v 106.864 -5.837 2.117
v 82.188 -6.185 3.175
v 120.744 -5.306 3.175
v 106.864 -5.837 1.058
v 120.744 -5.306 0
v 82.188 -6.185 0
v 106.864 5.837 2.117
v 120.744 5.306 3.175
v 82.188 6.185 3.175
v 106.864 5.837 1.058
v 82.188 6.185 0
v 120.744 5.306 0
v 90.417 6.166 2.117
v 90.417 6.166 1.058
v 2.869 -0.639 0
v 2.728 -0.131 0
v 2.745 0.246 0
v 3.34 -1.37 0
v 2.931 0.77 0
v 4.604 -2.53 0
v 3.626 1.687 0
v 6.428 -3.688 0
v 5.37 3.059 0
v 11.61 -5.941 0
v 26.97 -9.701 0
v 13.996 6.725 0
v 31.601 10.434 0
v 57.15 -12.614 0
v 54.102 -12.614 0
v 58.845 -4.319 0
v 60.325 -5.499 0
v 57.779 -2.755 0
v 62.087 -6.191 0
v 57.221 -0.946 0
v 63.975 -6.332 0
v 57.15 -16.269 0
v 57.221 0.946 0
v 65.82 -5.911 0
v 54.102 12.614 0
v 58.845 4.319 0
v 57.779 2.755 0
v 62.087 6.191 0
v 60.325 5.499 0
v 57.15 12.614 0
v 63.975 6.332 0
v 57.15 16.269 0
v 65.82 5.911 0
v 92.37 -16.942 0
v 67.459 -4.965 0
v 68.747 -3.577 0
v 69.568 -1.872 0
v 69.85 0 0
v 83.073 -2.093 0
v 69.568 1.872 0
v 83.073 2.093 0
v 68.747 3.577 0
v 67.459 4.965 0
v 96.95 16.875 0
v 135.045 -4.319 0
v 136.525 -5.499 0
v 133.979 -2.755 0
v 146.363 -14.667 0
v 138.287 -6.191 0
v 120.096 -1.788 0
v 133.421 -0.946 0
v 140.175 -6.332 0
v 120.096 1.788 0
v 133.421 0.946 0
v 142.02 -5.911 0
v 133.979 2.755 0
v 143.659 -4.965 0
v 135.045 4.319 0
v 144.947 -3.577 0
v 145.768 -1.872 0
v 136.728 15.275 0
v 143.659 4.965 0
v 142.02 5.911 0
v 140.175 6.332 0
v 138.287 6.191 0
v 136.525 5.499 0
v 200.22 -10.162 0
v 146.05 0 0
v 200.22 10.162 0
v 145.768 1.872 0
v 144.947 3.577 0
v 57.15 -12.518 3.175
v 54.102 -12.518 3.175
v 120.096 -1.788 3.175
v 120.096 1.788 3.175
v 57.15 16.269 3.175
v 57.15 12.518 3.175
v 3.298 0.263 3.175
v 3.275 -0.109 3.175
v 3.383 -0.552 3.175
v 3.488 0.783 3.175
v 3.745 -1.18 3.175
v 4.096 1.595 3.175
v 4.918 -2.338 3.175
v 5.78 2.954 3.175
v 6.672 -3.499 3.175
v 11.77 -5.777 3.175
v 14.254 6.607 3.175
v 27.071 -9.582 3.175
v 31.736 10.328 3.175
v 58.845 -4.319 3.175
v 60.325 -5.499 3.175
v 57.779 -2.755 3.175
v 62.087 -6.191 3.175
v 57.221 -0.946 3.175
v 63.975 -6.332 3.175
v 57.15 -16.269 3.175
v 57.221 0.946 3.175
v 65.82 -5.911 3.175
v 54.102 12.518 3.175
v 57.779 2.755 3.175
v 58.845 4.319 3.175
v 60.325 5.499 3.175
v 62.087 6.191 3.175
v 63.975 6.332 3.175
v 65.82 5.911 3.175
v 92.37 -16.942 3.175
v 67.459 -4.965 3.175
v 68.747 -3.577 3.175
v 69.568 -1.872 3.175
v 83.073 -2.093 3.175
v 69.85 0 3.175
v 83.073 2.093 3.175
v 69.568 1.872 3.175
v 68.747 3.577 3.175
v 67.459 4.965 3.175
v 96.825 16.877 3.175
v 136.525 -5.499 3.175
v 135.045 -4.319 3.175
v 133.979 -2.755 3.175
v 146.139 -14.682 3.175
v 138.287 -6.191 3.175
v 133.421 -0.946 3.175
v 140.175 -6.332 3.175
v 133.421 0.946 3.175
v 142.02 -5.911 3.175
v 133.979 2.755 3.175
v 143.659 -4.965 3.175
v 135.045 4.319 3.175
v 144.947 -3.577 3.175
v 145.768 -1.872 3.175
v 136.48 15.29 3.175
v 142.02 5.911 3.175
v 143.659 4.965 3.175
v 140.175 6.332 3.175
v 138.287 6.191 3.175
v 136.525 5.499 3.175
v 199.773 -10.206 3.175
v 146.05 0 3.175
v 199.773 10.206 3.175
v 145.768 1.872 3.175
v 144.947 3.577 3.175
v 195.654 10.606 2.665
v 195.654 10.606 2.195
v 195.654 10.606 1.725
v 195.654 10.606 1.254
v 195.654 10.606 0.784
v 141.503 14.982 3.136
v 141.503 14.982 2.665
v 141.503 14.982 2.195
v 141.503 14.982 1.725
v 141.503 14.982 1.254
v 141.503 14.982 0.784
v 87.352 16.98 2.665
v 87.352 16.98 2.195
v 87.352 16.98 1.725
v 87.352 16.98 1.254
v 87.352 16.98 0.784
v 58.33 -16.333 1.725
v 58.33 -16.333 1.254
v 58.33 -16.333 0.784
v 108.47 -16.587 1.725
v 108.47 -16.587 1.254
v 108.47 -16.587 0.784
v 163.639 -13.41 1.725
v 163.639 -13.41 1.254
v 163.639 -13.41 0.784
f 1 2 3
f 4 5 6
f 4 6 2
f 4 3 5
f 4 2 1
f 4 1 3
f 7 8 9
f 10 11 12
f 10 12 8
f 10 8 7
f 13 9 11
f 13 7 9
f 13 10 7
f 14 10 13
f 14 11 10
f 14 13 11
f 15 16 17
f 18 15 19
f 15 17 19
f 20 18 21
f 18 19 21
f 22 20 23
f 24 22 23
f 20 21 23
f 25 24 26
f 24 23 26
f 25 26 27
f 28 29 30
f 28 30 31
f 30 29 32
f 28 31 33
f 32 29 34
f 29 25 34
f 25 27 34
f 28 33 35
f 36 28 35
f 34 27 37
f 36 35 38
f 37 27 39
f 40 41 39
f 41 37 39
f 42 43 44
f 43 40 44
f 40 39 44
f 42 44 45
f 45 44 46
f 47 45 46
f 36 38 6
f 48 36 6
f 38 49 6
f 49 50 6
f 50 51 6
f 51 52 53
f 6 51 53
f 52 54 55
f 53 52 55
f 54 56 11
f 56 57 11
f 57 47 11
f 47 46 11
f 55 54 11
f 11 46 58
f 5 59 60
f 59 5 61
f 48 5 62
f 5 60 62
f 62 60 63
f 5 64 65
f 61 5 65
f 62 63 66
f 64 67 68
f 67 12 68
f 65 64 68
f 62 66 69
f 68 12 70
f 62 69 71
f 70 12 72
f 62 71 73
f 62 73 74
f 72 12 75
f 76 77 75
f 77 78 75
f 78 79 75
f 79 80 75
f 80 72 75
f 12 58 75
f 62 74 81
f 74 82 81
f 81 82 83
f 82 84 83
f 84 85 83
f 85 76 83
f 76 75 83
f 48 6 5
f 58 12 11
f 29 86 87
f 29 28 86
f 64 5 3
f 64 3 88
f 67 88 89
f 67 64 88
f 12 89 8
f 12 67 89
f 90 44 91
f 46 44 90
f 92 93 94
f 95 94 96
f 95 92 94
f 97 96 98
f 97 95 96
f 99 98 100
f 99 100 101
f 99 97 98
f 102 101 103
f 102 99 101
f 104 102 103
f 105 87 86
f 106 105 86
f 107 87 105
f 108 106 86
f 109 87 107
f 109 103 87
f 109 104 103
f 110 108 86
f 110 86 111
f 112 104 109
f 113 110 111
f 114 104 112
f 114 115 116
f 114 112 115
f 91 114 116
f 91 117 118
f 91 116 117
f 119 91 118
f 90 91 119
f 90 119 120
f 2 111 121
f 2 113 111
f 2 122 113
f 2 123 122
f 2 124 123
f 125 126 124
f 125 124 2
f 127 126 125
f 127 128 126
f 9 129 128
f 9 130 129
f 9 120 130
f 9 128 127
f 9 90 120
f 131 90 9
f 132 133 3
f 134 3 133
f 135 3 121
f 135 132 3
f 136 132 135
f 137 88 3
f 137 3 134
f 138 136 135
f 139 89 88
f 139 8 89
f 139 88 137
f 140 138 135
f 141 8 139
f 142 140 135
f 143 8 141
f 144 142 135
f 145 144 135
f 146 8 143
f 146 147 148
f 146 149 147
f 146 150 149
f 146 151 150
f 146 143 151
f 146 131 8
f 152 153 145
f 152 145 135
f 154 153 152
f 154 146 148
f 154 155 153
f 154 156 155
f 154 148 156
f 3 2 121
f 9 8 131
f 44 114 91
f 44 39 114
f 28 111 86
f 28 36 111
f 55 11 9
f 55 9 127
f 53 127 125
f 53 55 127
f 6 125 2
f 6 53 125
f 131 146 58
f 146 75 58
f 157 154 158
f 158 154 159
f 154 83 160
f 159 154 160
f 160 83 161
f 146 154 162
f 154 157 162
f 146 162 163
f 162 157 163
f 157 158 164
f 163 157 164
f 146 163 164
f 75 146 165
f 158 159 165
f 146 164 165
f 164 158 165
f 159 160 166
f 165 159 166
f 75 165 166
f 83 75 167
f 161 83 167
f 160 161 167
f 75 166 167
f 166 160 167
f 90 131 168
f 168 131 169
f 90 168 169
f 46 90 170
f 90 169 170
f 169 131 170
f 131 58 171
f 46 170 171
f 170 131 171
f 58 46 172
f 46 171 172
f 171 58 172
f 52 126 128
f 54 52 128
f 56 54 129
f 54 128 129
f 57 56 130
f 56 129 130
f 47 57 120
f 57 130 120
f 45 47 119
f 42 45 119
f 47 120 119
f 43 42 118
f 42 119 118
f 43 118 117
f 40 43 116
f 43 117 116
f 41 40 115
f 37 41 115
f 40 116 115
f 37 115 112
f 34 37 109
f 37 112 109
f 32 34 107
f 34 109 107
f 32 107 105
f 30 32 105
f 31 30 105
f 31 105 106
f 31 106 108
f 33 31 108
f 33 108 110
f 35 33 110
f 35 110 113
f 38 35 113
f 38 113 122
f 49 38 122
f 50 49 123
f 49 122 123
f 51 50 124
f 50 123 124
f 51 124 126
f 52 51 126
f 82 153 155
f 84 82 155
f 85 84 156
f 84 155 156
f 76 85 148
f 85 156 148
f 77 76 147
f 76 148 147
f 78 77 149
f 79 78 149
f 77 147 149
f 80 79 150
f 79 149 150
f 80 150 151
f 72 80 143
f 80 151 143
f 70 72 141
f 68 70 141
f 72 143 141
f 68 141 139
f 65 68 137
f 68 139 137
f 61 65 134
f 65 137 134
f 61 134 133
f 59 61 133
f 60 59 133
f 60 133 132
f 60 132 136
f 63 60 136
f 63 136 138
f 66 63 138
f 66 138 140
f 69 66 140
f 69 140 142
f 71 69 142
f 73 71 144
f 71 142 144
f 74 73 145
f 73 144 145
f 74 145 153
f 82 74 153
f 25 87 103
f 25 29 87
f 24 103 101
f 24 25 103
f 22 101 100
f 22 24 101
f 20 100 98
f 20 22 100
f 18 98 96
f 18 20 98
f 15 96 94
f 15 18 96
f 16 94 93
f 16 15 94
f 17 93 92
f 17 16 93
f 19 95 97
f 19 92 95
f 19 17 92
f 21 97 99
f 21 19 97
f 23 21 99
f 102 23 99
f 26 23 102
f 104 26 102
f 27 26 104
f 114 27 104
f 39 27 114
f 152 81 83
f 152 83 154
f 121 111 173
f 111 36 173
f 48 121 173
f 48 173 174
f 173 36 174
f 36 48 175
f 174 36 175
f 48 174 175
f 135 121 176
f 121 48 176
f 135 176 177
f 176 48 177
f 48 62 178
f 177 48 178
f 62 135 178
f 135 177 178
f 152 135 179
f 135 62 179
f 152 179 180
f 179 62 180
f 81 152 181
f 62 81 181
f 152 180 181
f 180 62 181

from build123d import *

# Parameters (mm, degrees)
BOSS_EXTRUDE1_DEPTH     = 3.175
SKETCH2_R               = 6.35
CUT_EXTRUDE1_DEPTH      = 3.175
CUT_EXTRUDE2_DEPTH      = 17.98531302
CUT_EXTRUDE2_DEPTH_BACK = 17.98531302
CUT_EXTRUDE3_DEPTH      = 7.62


with BuildPart() as part:
    # Sketch1 → Boss-Extrude1 (new body)
    with BuildSketch(Plane.XY):
        with BuildLine():
            add(Edge.make_bspline(
                [(283.0068, 0.356588568), (282.901747419, 0.44462405), (282.222988768, 0.361501496), (281.014292834, 0.701750535), (278.797705315, 0.912055534), (275.811625252, 1.363395917), (271.96510687, 1.867061556), (267.326448481, 2.487806401), (261.907718596, 3.189499382), (255.748156548, 3.970743632), (248.883761402, 4.817852882), (241.357474346, 5.719362844), (233.215556988, 6.664092103), (224.508147533, 7.639178426), (215.288960535, 8.632716794), (205.614900546, 9.632367333), (195.545587828, 10.625227013), (185.143130495, 11.597359066), (174.471591387, 12.536001404), (163.596880752, 13.425461607), (152.585818931, 14.251236992), (141.506392817, 14.997996378), (130.426867175, 15.650125673), (119.415450083, 16.19114965), (108.540147703, 16.606641404), (97.867696152, 16.883046032), (87.464049003, 17.006862886), (77.393132365, 16.968265808), (67.717036062, 16.75979946), (58.495320886, 16.376179449), (49.784748261, 15.816402284), (41.638853683, 15.082152298), (34.107484228, 14.179164014), (27.236546007, 13.115120527), (21.067675242, 11.901134861), (15.637028536, 10.550933877), (10.975465177, 9.077683717), (7.106668967, 7.49510566), (4.042977604, 5.813906592), (1.789105378, 4.030768344), (0.345518556, 2.10255275), (-0.161023932, 0), (0.345518556, -2.10255275), (1.789105378, -4.030768344), (4.042977604, -5.813906592), (7.106668967, -7.49510566), (10.975465177, -9.077683717), (15.637028536, -10.550933877), (21.067675242, -11.901134861), (27.236546007, -13.115120527), (34.107484228, -14.179164014), (41.638853683, -15.082152298), (49.784748261, -15.816402284), (58.495320886, -16.376179449), (67.717036062, -16.75979946), (77.393132365, -16.968265808), (87.464049003, -17.006862886), (97.867696152, -16.883046032), (108.540147703, -16.606641404), (119.415450083, -16.19114965), (130.426867175, -15.650125673), (141.506392817, -14.997996378), (152.585818931, -14.251236992), (163.596880752, -13.425461607), (174.471591387, -12.536001404), (185.143130495, -11.597359066), (195.545587828, -10.625227013), (205.614900546, -9.632367333), (215.288960535, -8.632716794), (224.508147533, -7.639178426), (233.215556988, -6.664092103), (241.357474346, -5.719362844), (248.883761402, -4.817852882), (255.748156548, -3.970743632), (261.907718596, -3.189499382), (267.326448481, -2.487806401), (271.96510687, -1.867061556), (275.811625252, -1.363395917), (278.797705315, -0.912055534), (281.014292834, -0.701750535), (282.222988768, -0.361501496), (283.176929529, -0.478323569), (283.176929529, 0.214017725), (283.0068, 0.356588568)],
                knots=[0, 0, 0, 0, 0.000762215, 0.003044706, 0.006832246, 0.012101176, 0.018817536, 0.026939455, 0.036414848, 0.047184628, 0.059180413, 0.072327874, 0.086544061, 0.10174058, 0.117823336, 0.134691452, 0.152240154, 0.17036129, 0.188941008, 0.207865435, 0.227016078, 0.246275696, 0.265524943, 0.284644966, 0.303520118, 0.322034575, 0.340078353, 0.357542593, 0.374325482, 0.390329891, 0.40546389, 0.419643801, 0.432793371, 0.444843817, 0.455737921, 0.465428653, 0.47388632, 0.481101634, 0.487101684, 0.491975368, 0.495930678, 0.499382808, 0.502834938, 0.506790248, 0.511663932, 0.517663982, 0.524879296, 0.533336963, 0.543027695, 0.553921799, 0.565972245, 0.579121815, 0.593301726, 0.608435725, 0.624440134, 0.641223023, 0.658687263, 0.676731041, 0.695245498, 0.71412065, 0.733240673, 0.75248992, 0.771749538, 0.790900181, 0.809824608, 0.828404326, 0.846525462, 0.864074164, 0.88094228, 0.897025036, 0.912221555, 0.926437743, 0.939585203, 0.951580988, 0.962350768, 0.971826162, 0.979948081, 0.986664441, 0.991933371, 0.99572091, 0.998003402, 0.998765616, 1, 1, 1, 1], degree=3))
        make_face()
    extrude(amount=BOSS_EXTRUDE1_DEPTH)

    # Sketch2 → Cut-Extrude1 (cut)
    with BuildSketch(Plane.XY.offset(3.175)):
        with Locations((63.5, 0)):
            Circle(SKETCH2_R)
        with Locations((139.7, 0)):
            Circle(SKETCH2_R)
    extrude(amount=-CUT_EXTRUDE1_DEPTH, mode=Mode.SUBTRACT)

    # Sketch3 → Cut-Extrude2 (cut, two sides)
    with BuildSketch(Plane(origin=(0, 0, 0), x_dir=(1, 0, 0), z_dir=(0, 1, 0))) as cut_extrude2_sk:
        Polygon((280.502264678, 570.685147201), (200.220132014, 0), (199.773483328, -3.175), (283.134397147, -3.175), (283.134397147, 0), (283.134397147, 576.304397051), (-760.640477334, 1065.222635252), (-763.272609802, 1059.603385401), align=None)
    extrude(amount=CUT_EXTRUDE2_DEPTH, mode=Mode.SUBTRACT)
    extrude(cut_extrude2_sk.sketch, amount=-CUT_EXTRUDE2_DEPTH_BACK, mode=Mode.SUBTRACT)

    # Sketch5 → Cut-Loft1 section 0
    with BuildSketch(Plane.XY.offset(3.175)):
        with BuildLine():
            Line((57.15, -15.840717611), (57.15, -12.517848774))
            Line((57.15, -12.517848774), (54.102, -12.517848774))
            add(Edge.make_bspline(
                [(54.102, 12.517848774), (52.905073826, 12.446922239), (50.510877245, 12.29292233), (46.923042309, 12.02249839), (43.342906141, 11.709637993), (39.772343425, 11.350207554), (36.212958119, 10.940125109), (32.668672918, 10.473083309), (29.140579279, 9.942416236), (26.221744689, 9.439792705), (23.899631399, 8.996334016), (22.168124881, 8.641223297), (20.447130555, 8.261260302), (18.73921392, 7.85440932), (17.04583843, 7.418483842), (15.37131979, 6.950314461), (13.720374707, 6.446953018), (12.099093951, 5.903590986), (10.516736009, 5.316840777), (8.982942702, 4.676356823), (7.515425701, 3.975597981), (6.148367378, 3.214391725), (5.132435214, 2.525362189), (4.436328841, 1.942644965), (3.99449908, 1.50088383), (3.639558845, 1.055711416), (3.418173473, 0.67028204), (3.294529971, 0.303832168), (3.258254336, 8.98e-07), (3.294531501, -0.303834398), (3.41817022, -0.670279004), (3.63956519, -1.05571658), (3.994486701, -1.500874192), (4.436322379, -1.942640233), (5.13276687, -2.525613649), (6.148175252, -3.21424607), (7.515525046, -3.97567324), (8.982885795, -4.676313816), (10.516775422, -5.316870372), (12.099068229, -5.90357211), (13.720394844, -6.446967156), (15.371289631, -6.95029465), (17.045828606, -7.418477981), (18.739219111, -7.854412516), (20.44713727, -8.261264475), (22.168119663, -8.641219802), (23.899622625, -8.996332253), (26.221845214, -9.439810116), (29.140506404, -9.942404258), (32.668709943, -10.473088914), (36.212941173, -10.940123046), (39.772346311, -11.350206942), (43.342914131, -11.709640819), (46.923012021, -12.0224901), (50.510859023, -12.292917903), (52.905073826, -12.446922239), (54.102, -12.517848774)],
                knots=[0, 0, 0, 0, 0.03125, 0.0625, 0.09375, 0.125, 0.15625, 0.1875, 0.21875, 0.25, 0.265625, 0.28125, 0.296875, 0.3125, 0.328125, 0.34375, 0.359375, 0.375, 0.390625, 0.40625, 0.421875, 0.4375, 0.453125, 0.4609375, 0.46875, 0.4765625, 0.484375, 0.4921875, 0.5, 0.5078125, 0.515625, 0.5234375, 0.53125, 0.5390625, 0.546875, 0.5625, 0.578125, 0.59375, 0.609375, 0.625, 0.640625, 0.65625, 0.671875, 0.6875, 0.703125, 0.71875, 0.734375, 0.75, 0.78125, 0.8125, 0.84375, 0.875, 0.90625, 0.9375, 0.96875, 1, 1, 1, 1], degree=3))
            Line((54.102, 12.517848774), (57.15, 12.517848774))
            Line((57.15, 12.517848774), (57.15, 15.840717611))
            Line((57.15, 15.840717611), (57.15, 24.528656823))
            Line((57.15, 24.528656823), (-13.660315185, 32.196838039))
            Line((-13.660315185, 32.196838039), (4.751362513, -35.926369443))
            Line((4.751362513, -35.926369443), (57.15, -29.012871964))
            Line((57.15, -29.012871964), (57.15, -15.840717611))
        make_face()
    # Sketch4 → Cut-Loft1 section 1
    with BuildSketch(Plane(origin=(0, 0, 0), x_dir=(-1, 0, 0), z_dir=(0, 0, -1))):
        with BuildLine():
            Line((-57.15, -15.931097341), (-57.15, -12.614401813))
            Line((-57.15, -12.614401813), (-54.102, -12.614401813))
            add(Edge.make_bspline(
                [(-54.102, 12.614401813), (-52.892966304, 12.543650374), (-50.474562395, 12.389900929), (-46.850429349, 12.119518431), (-43.233994008, 11.80632974), (-39.627106768, 11.446155851), (-36.031309682, 11.034861155), (-32.450571185, 10.566087473), (-28.885974607, 10.033109549), (-25.936699002, 9.527992325), (-23.590171059, 9.082138578), (-21.840349809, 8.725010585), (-20.101018277, 8.342781179), (-18.374759552, 7.933393598), (-16.663038707, 7.494638099), (-14.970151675, 7.023265253), (-13.3008012, 6.516250081), (-11.661107617, 5.968693544), (-10.06037111, 5.377118947), (-8.508330893, 4.731019213), (-7.022897298, 4.023737888), (-5.63853584, 3.25470078), (-4.609088563, 2.55765795), (-3.903506054, 1.967798123), (-3.455598612, 1.52050909), (-3.095749955, 1.069692125), (-2.871302388, 0.679325256), (-2.745924545, 0.30796261), (-2.7091298, 9.1e-07), (-2.745926097, -0.307964873), (-2.871299087, -0.679322175), (-3.095756394, -1.069697364), (-3.455586055, -1.520499314), (-3.903499495, -1.967793321), (-4.609425021, -2.557913052), (-5.638340949, -3.254553026), (-7.022998045, -4.023814214), (-8.50827323, -4.730975626), (-10.060410962, -5.377148887), (-11.661081805, -5.968674575), (-13.300821123, -6.516264103), (-14.970122445, -7.02324602), (-16.6630295, -7.494632633), (-18.374764393, -7.933396571), (-20.10102481, -8.342785237), (-21.840344745, -8.725007186), (-23.590162295, -9.082136874), (-25.936800786, -9.528009858), (-28.88590077, -10.033097475), (-32.450608778, -10.56609314), (-36.031292313, -11.034859029), (-39.627110143, -11.446155342), (-43.234001329, -11.806332406), (-46.850400529, -12.119510514), (-50.474544843, -12.389896679), (-52.892966304, -12.543650374), (-54.102, -12.614401813)],
                knots=[0, 0, 0, 0, 0.03125, 0.0625, 0.09375, 0.125, 0.15625, 0.1875, 0.21875, 0.25, 0.265625, 0.28125, 0.296875, 0.3125, 0.328125, 0.34375, 0.359375, 0.375, 0.390625, 0.40625, 0.421875, 0.4375, 0.453125, 0.4609375, 0.46875, 0.4765625, 0.484375, 0.4921875, 0.5, 0.5078125, 0.515625, 0.5234375, 0.53125, 0.5390625, 0.546875, 0.5625, 0.578125, 0.59375, 0.609375, 0.625, 0.640625, 0.65625, 0.671875, 0.6875, 0.703125, 0.71875, 0.734375, 0.75, 0.78125, 0.8125, 0.84375, 0.875, 0.90625, 0.9375, 0.96875, 1, 1, 1, 1], degree=3))
            Line((-54.102, 12.614401813), (-57.15, 12.614401813))
            Line((-57.15, 12.614401813), (-57.15, 15.931097341))
            Line((-57.15, 15.931097341), (-57.15, 23.768946795))
            Line((-57.15, 23.768946795), (16.290986713, 29.461293478))
            Line((16.290986713, 29.461293478), (3.107394198, -36.097931887))
            Line((3.107394198, -36.097931887), (-57.15, -26.910981695))
            Line((-57.15, -26.910981695), (-57.15, -15.931097341))
        make_face()
    loft(mode=Mode.SUBTRACT)

    # Sketch6 → Cut-Extrude3 (cut)
    with BuildSketch(Plane(origin=(0, 0, 0), x_dir=(-1, 0, 0), z_dir=(0, 0, -1))):
        with BuildLine():
            ThreePointArc((-120.7436607, -5.30626284), (-120.015, 0), (-120.7436607, 5.30626284))
            add(Edge.make_bspline(
                [(-120.7436607, 5.30626284), (-116.113978677, 5.516834405), (-111.486849996, 5.695579464), (-101.374008891, 6.004242594), (-95.890716435, 6.118585943), (-87.671447186, 6.189682577), (-84.92815734, 6.19667575), (-82.188251061, 6.184536948)],
                knots=[0.519741838, 0.519741838, 0.519741838, 0.519741838, 0.625, 0.625, 0.75, 0.75, 0.812699407, 0.812699407, 0.812699407, 0.812699407], degree=3))
            ThreePointArc((-82.188251061, 6.184536948), (-83.185, 0), (-82.188251061, -6.184536948))
            add(Edge.make_bspline(
                [(-82.188251061, -6.184536948), (-84.92815734, -6.19667575), (-87.671447186, -6.189682577), (-95.890716436, -6.118585943), (-101.374008891, -6.004242594), (-111.486849996, -5.695579464), (-116.113978677, -5.516834405), (-120.7436607, -5.30626284)],
                knots=[0.187300593, 0.187300593, 0.187300593, 0.187300593, 0.25, 0.25, 0.375, 0.375, 0.480258162, 0.480258162, 0.480258162, 0.480258162], degree=3))
        make_face()
    extrude(amount=-CUT_EXTRUDE3_DEPTH, mode=Mode.SUBTRACT)


solid = part.part
